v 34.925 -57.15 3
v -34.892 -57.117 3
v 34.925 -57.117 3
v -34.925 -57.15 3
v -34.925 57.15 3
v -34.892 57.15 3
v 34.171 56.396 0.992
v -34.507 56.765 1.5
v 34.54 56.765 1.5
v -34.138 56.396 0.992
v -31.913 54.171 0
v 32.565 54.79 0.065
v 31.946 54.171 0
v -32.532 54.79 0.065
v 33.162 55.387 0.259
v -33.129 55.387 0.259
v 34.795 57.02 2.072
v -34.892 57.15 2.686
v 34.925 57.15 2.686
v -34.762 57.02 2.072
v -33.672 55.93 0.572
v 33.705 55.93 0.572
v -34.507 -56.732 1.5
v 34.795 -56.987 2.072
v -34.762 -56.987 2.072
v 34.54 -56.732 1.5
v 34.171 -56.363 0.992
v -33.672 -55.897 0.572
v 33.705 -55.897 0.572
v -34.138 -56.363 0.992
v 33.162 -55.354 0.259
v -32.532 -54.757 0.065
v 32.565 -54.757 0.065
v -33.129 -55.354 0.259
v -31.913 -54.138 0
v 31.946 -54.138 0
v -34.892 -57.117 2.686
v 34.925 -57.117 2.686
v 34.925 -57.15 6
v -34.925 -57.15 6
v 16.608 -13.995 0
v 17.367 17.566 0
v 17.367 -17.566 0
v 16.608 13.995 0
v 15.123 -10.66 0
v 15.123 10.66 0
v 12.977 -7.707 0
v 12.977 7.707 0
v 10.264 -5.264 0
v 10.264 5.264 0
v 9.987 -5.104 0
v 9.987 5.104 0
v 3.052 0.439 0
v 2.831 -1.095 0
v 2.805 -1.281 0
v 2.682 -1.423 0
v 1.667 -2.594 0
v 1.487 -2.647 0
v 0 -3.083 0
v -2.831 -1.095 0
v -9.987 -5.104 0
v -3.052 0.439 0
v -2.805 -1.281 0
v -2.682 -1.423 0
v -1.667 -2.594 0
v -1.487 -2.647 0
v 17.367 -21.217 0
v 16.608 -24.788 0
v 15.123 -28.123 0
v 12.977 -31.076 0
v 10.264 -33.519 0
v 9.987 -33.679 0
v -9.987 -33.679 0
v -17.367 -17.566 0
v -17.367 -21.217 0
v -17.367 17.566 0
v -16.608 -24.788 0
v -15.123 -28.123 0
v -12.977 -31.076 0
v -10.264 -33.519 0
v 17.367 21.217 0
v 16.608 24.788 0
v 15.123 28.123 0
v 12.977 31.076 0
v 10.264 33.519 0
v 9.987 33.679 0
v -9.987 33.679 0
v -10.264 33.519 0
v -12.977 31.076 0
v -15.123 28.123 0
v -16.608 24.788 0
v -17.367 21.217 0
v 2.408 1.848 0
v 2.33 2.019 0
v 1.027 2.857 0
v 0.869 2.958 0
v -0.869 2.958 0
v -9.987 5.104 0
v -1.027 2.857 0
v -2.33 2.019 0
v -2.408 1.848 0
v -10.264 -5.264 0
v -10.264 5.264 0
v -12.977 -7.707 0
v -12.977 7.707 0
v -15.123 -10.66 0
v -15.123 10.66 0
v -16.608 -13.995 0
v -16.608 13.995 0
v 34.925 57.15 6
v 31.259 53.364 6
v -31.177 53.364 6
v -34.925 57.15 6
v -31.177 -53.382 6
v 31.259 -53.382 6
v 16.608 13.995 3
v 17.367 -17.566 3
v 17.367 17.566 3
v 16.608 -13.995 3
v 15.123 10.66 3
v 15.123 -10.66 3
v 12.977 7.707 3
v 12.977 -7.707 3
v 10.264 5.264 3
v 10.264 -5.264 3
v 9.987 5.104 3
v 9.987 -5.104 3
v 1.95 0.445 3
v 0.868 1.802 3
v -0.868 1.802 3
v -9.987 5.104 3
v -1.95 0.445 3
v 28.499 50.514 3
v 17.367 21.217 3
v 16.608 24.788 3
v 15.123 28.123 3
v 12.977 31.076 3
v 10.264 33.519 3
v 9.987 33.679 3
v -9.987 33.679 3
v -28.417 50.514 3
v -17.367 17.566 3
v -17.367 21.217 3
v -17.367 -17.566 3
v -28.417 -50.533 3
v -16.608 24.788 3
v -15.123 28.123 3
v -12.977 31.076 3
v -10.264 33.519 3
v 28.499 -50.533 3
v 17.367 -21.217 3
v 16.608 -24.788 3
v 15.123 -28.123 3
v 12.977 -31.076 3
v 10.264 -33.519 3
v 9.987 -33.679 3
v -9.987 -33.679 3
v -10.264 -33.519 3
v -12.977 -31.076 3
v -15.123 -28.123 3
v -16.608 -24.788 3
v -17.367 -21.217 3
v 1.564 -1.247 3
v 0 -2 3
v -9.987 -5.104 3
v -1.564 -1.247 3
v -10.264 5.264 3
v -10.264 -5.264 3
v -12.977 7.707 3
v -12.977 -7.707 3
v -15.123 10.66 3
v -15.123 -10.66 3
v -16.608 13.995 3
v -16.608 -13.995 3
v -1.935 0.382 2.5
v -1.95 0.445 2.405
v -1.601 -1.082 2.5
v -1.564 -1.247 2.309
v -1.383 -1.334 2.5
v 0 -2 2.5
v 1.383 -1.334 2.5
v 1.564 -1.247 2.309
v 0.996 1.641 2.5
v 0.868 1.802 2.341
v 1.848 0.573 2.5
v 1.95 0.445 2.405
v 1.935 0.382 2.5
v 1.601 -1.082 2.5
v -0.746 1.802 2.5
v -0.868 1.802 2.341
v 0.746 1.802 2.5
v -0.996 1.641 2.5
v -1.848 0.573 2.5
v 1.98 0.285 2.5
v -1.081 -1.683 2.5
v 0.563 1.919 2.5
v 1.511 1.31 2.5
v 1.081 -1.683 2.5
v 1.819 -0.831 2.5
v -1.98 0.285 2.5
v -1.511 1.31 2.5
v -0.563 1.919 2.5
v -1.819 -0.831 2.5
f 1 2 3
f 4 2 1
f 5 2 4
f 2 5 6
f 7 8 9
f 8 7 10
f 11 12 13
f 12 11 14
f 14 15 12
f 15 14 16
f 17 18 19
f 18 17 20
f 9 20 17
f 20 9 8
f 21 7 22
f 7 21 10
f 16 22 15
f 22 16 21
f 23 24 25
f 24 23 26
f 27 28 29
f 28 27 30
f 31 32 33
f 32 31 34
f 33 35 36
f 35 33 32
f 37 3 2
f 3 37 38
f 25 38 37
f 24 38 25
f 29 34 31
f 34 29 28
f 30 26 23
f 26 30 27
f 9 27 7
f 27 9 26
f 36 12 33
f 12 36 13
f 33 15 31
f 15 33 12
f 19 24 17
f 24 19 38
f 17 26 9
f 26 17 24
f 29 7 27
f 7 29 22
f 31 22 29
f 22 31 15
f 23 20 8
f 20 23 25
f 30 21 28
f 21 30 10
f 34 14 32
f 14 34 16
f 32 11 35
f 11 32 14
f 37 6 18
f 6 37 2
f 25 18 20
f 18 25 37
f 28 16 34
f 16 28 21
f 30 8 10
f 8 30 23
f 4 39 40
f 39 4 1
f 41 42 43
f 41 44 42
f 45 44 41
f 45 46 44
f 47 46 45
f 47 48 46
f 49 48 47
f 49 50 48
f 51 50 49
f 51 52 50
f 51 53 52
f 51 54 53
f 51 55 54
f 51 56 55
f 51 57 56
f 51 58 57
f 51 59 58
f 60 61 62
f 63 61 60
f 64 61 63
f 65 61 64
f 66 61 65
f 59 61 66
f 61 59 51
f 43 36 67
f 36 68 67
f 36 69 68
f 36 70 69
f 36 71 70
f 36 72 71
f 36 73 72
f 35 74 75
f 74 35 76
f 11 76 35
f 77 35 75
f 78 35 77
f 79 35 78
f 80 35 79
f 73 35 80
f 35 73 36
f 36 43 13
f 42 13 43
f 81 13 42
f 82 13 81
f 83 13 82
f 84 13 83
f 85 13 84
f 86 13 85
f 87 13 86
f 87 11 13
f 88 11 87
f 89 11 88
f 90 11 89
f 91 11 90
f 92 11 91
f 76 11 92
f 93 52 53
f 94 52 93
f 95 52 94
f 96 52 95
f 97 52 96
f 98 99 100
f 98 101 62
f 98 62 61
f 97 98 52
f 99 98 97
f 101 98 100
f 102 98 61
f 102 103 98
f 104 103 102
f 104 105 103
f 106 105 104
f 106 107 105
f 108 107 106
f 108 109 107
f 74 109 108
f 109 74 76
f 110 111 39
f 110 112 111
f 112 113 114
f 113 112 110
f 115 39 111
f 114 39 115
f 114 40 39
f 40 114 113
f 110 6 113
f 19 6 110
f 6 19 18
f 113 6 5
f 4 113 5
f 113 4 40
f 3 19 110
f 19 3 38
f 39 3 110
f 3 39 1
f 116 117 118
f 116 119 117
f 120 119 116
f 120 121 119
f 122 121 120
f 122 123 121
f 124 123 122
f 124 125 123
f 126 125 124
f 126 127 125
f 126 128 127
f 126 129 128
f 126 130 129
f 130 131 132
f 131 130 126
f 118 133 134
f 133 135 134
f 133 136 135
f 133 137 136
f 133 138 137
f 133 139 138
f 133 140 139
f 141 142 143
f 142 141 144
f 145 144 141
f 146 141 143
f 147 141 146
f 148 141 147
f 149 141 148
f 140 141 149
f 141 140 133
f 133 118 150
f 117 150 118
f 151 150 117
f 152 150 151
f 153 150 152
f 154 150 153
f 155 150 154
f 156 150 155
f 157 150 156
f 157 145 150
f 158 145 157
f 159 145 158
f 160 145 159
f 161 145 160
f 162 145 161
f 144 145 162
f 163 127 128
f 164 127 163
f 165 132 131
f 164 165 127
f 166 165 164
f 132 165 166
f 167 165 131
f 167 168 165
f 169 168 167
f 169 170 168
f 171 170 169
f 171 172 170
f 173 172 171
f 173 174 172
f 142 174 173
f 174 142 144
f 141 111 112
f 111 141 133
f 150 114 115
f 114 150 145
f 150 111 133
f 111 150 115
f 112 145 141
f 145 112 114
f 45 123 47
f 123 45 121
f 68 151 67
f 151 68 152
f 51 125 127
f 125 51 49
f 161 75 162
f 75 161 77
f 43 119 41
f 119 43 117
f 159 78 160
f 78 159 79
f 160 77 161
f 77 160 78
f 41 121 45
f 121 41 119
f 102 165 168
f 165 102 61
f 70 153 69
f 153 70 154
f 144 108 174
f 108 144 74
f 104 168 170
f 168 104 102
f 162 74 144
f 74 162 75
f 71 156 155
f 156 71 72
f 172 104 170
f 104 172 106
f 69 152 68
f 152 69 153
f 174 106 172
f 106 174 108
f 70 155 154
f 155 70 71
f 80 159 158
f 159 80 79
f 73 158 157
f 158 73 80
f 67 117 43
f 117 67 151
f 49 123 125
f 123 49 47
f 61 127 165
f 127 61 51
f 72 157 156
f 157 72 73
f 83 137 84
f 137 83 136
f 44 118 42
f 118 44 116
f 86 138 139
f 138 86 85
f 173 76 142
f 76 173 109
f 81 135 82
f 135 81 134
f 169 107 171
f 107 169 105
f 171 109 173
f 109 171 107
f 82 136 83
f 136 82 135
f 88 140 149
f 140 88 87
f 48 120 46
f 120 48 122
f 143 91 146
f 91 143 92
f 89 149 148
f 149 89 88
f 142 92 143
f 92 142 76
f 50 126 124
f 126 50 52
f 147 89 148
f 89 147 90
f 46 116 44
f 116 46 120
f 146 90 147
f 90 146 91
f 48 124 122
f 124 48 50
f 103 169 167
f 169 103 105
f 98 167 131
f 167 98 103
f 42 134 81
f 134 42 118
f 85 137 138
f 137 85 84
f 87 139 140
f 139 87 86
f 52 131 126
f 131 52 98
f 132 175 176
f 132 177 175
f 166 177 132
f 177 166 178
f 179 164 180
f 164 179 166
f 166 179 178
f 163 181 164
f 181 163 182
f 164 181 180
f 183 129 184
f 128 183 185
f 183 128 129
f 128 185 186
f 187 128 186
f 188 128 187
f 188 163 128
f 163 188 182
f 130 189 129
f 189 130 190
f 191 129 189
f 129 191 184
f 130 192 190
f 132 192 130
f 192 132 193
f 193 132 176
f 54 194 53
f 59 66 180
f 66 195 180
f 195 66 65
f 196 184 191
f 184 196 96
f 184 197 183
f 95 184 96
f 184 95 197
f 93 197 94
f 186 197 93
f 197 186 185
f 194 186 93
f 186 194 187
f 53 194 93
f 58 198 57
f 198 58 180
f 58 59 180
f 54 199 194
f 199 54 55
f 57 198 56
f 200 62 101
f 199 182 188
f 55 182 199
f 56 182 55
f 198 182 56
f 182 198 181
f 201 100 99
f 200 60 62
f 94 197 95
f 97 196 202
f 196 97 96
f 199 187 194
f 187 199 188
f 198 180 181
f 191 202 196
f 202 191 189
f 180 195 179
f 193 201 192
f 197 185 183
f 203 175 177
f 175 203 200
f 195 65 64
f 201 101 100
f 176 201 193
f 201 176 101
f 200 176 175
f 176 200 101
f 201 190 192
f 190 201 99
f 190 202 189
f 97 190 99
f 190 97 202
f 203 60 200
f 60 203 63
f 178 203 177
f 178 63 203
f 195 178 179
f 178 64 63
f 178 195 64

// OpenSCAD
part="plate";
font="Verdana:style=Bold";
spacing=1.1;
include <WALLY_Customizer.scad>;
difference(){
  wally_customizer();
*  translate([52,0,-.01]) linear_extrude(1) rotate([0,0,90]) mirror([0,1,0]) text("Hall",halign="center",valign="center",font=font,spacing=spacing);
*  translate([-52,0,-.01]) linear_extrude(1) rotate([0,0,270]) mirror([0,1,0]) text("Living",halign="center",valign="center",font=font,spacing=spacing);
}
